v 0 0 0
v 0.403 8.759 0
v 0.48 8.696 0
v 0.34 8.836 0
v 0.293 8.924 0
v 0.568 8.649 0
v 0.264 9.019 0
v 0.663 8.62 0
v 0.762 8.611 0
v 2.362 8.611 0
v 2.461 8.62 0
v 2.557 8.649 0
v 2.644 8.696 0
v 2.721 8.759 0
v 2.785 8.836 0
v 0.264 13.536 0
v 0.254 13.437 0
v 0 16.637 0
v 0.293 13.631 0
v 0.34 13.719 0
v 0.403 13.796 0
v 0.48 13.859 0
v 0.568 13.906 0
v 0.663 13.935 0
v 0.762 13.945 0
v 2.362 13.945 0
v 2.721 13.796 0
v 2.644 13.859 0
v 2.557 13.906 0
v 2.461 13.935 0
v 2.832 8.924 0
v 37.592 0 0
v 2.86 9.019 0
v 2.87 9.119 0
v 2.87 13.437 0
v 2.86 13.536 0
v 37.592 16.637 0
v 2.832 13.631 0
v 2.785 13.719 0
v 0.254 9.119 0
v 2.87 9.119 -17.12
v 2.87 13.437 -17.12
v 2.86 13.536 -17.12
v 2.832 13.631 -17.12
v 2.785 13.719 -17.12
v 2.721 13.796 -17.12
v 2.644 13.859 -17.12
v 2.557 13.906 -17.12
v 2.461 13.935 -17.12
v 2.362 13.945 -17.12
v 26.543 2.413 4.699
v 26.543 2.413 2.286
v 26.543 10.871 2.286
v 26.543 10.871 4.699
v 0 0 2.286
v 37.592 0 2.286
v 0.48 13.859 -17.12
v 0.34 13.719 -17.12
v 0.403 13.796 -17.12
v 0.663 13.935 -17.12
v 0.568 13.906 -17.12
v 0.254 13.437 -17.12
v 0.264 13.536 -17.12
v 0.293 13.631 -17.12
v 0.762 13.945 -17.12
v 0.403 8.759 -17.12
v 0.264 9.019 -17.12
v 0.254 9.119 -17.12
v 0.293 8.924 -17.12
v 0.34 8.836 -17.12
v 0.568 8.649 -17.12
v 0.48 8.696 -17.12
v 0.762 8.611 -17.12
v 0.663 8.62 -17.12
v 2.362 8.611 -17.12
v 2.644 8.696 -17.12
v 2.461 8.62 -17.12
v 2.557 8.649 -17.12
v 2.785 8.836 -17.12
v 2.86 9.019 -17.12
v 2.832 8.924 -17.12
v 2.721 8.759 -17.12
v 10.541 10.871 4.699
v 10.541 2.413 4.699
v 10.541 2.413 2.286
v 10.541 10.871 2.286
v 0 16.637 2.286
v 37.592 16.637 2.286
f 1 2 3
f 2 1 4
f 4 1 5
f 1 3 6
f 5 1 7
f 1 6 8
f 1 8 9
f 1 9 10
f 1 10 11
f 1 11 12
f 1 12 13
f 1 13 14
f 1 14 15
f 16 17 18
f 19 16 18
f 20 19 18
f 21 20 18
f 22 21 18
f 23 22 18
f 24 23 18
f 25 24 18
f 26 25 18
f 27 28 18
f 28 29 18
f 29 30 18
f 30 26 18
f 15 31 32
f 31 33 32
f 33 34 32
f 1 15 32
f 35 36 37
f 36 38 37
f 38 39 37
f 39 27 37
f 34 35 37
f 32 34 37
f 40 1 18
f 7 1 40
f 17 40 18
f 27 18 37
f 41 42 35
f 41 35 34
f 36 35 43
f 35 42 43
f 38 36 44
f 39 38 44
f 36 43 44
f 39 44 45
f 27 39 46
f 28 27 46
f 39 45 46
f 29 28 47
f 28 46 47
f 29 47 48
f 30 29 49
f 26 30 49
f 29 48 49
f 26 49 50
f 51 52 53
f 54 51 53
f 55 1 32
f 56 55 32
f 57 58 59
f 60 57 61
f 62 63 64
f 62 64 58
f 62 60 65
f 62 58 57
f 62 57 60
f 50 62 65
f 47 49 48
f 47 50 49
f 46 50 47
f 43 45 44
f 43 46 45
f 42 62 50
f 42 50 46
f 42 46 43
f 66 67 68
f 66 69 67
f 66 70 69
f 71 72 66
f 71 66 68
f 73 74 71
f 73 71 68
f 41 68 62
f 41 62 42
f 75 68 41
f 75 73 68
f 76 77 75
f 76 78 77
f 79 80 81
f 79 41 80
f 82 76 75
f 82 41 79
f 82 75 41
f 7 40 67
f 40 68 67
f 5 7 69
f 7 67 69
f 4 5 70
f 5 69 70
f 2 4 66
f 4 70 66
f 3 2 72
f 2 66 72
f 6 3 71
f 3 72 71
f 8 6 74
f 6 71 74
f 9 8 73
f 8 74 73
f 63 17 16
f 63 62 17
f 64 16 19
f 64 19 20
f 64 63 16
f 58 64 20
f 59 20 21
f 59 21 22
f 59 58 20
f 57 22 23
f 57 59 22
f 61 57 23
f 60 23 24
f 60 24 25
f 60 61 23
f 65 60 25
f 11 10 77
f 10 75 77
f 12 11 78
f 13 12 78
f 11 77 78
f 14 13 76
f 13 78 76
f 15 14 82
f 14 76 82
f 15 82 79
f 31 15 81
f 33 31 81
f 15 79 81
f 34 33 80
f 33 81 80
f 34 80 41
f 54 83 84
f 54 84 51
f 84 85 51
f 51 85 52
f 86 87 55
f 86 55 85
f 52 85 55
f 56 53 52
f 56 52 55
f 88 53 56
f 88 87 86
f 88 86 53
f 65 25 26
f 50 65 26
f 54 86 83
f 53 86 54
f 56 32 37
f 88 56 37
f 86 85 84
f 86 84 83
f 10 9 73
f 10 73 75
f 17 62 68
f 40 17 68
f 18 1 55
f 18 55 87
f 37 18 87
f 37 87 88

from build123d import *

# Parameters (mm, degrees)
F0_W     = 37.592
F0_H     = 16.637
F1_DEPTH = 2.286
F2_W     = 16.002
F2_H     = 8.4582
F3_DEPTH = 2.413
F4_W     = 2.6162
F4_H     = 5.334
F5_DEPTH = 17.1196
F6_R     = 0.508


with BuildPart() as f1:
    # F0 (on Top) → F1 (new body)
    with BuildSketch(Plane.XY):
        with Locations((18.796, 8.3185)):
            Rectangle(F0_W, F0_H)
    extrude(amount=F1_DEPTH)

    # F2 (on face) → F3 (join)
    with BuildSketch(Plane.XY.offset(2.286)):
        with Locations((18.542, 6.6421)):
            Rectangle(F2_W, F2_H)
    extrude(amount=F3_DEPTH)

    # F4 (on face) → F5 (join)
    with BuildSketch(Plane(origin=(0, 0, 0), x_dir=(1, 0, 0), z_dir=(0, 0, -1))):
        with Locations((1.5621, -11.2776)):
            Rectangle(F4_W, F4_H)
    extrude(amount=F5_DEPTH)

    # F6
    f6_edges = [f1.edges().sort_by_distance(p)[0] for p in [
        (2.8702, 13.9446, -8.5598),
        (0.254, 13.9446, -8.5598),
        (2.8702, 8.6106, -8.5598),
        (0.254, 8.6106, -8.5598),
    ]]
    fillet(f6_edges, radius=F6_R)


solid = f1.part
